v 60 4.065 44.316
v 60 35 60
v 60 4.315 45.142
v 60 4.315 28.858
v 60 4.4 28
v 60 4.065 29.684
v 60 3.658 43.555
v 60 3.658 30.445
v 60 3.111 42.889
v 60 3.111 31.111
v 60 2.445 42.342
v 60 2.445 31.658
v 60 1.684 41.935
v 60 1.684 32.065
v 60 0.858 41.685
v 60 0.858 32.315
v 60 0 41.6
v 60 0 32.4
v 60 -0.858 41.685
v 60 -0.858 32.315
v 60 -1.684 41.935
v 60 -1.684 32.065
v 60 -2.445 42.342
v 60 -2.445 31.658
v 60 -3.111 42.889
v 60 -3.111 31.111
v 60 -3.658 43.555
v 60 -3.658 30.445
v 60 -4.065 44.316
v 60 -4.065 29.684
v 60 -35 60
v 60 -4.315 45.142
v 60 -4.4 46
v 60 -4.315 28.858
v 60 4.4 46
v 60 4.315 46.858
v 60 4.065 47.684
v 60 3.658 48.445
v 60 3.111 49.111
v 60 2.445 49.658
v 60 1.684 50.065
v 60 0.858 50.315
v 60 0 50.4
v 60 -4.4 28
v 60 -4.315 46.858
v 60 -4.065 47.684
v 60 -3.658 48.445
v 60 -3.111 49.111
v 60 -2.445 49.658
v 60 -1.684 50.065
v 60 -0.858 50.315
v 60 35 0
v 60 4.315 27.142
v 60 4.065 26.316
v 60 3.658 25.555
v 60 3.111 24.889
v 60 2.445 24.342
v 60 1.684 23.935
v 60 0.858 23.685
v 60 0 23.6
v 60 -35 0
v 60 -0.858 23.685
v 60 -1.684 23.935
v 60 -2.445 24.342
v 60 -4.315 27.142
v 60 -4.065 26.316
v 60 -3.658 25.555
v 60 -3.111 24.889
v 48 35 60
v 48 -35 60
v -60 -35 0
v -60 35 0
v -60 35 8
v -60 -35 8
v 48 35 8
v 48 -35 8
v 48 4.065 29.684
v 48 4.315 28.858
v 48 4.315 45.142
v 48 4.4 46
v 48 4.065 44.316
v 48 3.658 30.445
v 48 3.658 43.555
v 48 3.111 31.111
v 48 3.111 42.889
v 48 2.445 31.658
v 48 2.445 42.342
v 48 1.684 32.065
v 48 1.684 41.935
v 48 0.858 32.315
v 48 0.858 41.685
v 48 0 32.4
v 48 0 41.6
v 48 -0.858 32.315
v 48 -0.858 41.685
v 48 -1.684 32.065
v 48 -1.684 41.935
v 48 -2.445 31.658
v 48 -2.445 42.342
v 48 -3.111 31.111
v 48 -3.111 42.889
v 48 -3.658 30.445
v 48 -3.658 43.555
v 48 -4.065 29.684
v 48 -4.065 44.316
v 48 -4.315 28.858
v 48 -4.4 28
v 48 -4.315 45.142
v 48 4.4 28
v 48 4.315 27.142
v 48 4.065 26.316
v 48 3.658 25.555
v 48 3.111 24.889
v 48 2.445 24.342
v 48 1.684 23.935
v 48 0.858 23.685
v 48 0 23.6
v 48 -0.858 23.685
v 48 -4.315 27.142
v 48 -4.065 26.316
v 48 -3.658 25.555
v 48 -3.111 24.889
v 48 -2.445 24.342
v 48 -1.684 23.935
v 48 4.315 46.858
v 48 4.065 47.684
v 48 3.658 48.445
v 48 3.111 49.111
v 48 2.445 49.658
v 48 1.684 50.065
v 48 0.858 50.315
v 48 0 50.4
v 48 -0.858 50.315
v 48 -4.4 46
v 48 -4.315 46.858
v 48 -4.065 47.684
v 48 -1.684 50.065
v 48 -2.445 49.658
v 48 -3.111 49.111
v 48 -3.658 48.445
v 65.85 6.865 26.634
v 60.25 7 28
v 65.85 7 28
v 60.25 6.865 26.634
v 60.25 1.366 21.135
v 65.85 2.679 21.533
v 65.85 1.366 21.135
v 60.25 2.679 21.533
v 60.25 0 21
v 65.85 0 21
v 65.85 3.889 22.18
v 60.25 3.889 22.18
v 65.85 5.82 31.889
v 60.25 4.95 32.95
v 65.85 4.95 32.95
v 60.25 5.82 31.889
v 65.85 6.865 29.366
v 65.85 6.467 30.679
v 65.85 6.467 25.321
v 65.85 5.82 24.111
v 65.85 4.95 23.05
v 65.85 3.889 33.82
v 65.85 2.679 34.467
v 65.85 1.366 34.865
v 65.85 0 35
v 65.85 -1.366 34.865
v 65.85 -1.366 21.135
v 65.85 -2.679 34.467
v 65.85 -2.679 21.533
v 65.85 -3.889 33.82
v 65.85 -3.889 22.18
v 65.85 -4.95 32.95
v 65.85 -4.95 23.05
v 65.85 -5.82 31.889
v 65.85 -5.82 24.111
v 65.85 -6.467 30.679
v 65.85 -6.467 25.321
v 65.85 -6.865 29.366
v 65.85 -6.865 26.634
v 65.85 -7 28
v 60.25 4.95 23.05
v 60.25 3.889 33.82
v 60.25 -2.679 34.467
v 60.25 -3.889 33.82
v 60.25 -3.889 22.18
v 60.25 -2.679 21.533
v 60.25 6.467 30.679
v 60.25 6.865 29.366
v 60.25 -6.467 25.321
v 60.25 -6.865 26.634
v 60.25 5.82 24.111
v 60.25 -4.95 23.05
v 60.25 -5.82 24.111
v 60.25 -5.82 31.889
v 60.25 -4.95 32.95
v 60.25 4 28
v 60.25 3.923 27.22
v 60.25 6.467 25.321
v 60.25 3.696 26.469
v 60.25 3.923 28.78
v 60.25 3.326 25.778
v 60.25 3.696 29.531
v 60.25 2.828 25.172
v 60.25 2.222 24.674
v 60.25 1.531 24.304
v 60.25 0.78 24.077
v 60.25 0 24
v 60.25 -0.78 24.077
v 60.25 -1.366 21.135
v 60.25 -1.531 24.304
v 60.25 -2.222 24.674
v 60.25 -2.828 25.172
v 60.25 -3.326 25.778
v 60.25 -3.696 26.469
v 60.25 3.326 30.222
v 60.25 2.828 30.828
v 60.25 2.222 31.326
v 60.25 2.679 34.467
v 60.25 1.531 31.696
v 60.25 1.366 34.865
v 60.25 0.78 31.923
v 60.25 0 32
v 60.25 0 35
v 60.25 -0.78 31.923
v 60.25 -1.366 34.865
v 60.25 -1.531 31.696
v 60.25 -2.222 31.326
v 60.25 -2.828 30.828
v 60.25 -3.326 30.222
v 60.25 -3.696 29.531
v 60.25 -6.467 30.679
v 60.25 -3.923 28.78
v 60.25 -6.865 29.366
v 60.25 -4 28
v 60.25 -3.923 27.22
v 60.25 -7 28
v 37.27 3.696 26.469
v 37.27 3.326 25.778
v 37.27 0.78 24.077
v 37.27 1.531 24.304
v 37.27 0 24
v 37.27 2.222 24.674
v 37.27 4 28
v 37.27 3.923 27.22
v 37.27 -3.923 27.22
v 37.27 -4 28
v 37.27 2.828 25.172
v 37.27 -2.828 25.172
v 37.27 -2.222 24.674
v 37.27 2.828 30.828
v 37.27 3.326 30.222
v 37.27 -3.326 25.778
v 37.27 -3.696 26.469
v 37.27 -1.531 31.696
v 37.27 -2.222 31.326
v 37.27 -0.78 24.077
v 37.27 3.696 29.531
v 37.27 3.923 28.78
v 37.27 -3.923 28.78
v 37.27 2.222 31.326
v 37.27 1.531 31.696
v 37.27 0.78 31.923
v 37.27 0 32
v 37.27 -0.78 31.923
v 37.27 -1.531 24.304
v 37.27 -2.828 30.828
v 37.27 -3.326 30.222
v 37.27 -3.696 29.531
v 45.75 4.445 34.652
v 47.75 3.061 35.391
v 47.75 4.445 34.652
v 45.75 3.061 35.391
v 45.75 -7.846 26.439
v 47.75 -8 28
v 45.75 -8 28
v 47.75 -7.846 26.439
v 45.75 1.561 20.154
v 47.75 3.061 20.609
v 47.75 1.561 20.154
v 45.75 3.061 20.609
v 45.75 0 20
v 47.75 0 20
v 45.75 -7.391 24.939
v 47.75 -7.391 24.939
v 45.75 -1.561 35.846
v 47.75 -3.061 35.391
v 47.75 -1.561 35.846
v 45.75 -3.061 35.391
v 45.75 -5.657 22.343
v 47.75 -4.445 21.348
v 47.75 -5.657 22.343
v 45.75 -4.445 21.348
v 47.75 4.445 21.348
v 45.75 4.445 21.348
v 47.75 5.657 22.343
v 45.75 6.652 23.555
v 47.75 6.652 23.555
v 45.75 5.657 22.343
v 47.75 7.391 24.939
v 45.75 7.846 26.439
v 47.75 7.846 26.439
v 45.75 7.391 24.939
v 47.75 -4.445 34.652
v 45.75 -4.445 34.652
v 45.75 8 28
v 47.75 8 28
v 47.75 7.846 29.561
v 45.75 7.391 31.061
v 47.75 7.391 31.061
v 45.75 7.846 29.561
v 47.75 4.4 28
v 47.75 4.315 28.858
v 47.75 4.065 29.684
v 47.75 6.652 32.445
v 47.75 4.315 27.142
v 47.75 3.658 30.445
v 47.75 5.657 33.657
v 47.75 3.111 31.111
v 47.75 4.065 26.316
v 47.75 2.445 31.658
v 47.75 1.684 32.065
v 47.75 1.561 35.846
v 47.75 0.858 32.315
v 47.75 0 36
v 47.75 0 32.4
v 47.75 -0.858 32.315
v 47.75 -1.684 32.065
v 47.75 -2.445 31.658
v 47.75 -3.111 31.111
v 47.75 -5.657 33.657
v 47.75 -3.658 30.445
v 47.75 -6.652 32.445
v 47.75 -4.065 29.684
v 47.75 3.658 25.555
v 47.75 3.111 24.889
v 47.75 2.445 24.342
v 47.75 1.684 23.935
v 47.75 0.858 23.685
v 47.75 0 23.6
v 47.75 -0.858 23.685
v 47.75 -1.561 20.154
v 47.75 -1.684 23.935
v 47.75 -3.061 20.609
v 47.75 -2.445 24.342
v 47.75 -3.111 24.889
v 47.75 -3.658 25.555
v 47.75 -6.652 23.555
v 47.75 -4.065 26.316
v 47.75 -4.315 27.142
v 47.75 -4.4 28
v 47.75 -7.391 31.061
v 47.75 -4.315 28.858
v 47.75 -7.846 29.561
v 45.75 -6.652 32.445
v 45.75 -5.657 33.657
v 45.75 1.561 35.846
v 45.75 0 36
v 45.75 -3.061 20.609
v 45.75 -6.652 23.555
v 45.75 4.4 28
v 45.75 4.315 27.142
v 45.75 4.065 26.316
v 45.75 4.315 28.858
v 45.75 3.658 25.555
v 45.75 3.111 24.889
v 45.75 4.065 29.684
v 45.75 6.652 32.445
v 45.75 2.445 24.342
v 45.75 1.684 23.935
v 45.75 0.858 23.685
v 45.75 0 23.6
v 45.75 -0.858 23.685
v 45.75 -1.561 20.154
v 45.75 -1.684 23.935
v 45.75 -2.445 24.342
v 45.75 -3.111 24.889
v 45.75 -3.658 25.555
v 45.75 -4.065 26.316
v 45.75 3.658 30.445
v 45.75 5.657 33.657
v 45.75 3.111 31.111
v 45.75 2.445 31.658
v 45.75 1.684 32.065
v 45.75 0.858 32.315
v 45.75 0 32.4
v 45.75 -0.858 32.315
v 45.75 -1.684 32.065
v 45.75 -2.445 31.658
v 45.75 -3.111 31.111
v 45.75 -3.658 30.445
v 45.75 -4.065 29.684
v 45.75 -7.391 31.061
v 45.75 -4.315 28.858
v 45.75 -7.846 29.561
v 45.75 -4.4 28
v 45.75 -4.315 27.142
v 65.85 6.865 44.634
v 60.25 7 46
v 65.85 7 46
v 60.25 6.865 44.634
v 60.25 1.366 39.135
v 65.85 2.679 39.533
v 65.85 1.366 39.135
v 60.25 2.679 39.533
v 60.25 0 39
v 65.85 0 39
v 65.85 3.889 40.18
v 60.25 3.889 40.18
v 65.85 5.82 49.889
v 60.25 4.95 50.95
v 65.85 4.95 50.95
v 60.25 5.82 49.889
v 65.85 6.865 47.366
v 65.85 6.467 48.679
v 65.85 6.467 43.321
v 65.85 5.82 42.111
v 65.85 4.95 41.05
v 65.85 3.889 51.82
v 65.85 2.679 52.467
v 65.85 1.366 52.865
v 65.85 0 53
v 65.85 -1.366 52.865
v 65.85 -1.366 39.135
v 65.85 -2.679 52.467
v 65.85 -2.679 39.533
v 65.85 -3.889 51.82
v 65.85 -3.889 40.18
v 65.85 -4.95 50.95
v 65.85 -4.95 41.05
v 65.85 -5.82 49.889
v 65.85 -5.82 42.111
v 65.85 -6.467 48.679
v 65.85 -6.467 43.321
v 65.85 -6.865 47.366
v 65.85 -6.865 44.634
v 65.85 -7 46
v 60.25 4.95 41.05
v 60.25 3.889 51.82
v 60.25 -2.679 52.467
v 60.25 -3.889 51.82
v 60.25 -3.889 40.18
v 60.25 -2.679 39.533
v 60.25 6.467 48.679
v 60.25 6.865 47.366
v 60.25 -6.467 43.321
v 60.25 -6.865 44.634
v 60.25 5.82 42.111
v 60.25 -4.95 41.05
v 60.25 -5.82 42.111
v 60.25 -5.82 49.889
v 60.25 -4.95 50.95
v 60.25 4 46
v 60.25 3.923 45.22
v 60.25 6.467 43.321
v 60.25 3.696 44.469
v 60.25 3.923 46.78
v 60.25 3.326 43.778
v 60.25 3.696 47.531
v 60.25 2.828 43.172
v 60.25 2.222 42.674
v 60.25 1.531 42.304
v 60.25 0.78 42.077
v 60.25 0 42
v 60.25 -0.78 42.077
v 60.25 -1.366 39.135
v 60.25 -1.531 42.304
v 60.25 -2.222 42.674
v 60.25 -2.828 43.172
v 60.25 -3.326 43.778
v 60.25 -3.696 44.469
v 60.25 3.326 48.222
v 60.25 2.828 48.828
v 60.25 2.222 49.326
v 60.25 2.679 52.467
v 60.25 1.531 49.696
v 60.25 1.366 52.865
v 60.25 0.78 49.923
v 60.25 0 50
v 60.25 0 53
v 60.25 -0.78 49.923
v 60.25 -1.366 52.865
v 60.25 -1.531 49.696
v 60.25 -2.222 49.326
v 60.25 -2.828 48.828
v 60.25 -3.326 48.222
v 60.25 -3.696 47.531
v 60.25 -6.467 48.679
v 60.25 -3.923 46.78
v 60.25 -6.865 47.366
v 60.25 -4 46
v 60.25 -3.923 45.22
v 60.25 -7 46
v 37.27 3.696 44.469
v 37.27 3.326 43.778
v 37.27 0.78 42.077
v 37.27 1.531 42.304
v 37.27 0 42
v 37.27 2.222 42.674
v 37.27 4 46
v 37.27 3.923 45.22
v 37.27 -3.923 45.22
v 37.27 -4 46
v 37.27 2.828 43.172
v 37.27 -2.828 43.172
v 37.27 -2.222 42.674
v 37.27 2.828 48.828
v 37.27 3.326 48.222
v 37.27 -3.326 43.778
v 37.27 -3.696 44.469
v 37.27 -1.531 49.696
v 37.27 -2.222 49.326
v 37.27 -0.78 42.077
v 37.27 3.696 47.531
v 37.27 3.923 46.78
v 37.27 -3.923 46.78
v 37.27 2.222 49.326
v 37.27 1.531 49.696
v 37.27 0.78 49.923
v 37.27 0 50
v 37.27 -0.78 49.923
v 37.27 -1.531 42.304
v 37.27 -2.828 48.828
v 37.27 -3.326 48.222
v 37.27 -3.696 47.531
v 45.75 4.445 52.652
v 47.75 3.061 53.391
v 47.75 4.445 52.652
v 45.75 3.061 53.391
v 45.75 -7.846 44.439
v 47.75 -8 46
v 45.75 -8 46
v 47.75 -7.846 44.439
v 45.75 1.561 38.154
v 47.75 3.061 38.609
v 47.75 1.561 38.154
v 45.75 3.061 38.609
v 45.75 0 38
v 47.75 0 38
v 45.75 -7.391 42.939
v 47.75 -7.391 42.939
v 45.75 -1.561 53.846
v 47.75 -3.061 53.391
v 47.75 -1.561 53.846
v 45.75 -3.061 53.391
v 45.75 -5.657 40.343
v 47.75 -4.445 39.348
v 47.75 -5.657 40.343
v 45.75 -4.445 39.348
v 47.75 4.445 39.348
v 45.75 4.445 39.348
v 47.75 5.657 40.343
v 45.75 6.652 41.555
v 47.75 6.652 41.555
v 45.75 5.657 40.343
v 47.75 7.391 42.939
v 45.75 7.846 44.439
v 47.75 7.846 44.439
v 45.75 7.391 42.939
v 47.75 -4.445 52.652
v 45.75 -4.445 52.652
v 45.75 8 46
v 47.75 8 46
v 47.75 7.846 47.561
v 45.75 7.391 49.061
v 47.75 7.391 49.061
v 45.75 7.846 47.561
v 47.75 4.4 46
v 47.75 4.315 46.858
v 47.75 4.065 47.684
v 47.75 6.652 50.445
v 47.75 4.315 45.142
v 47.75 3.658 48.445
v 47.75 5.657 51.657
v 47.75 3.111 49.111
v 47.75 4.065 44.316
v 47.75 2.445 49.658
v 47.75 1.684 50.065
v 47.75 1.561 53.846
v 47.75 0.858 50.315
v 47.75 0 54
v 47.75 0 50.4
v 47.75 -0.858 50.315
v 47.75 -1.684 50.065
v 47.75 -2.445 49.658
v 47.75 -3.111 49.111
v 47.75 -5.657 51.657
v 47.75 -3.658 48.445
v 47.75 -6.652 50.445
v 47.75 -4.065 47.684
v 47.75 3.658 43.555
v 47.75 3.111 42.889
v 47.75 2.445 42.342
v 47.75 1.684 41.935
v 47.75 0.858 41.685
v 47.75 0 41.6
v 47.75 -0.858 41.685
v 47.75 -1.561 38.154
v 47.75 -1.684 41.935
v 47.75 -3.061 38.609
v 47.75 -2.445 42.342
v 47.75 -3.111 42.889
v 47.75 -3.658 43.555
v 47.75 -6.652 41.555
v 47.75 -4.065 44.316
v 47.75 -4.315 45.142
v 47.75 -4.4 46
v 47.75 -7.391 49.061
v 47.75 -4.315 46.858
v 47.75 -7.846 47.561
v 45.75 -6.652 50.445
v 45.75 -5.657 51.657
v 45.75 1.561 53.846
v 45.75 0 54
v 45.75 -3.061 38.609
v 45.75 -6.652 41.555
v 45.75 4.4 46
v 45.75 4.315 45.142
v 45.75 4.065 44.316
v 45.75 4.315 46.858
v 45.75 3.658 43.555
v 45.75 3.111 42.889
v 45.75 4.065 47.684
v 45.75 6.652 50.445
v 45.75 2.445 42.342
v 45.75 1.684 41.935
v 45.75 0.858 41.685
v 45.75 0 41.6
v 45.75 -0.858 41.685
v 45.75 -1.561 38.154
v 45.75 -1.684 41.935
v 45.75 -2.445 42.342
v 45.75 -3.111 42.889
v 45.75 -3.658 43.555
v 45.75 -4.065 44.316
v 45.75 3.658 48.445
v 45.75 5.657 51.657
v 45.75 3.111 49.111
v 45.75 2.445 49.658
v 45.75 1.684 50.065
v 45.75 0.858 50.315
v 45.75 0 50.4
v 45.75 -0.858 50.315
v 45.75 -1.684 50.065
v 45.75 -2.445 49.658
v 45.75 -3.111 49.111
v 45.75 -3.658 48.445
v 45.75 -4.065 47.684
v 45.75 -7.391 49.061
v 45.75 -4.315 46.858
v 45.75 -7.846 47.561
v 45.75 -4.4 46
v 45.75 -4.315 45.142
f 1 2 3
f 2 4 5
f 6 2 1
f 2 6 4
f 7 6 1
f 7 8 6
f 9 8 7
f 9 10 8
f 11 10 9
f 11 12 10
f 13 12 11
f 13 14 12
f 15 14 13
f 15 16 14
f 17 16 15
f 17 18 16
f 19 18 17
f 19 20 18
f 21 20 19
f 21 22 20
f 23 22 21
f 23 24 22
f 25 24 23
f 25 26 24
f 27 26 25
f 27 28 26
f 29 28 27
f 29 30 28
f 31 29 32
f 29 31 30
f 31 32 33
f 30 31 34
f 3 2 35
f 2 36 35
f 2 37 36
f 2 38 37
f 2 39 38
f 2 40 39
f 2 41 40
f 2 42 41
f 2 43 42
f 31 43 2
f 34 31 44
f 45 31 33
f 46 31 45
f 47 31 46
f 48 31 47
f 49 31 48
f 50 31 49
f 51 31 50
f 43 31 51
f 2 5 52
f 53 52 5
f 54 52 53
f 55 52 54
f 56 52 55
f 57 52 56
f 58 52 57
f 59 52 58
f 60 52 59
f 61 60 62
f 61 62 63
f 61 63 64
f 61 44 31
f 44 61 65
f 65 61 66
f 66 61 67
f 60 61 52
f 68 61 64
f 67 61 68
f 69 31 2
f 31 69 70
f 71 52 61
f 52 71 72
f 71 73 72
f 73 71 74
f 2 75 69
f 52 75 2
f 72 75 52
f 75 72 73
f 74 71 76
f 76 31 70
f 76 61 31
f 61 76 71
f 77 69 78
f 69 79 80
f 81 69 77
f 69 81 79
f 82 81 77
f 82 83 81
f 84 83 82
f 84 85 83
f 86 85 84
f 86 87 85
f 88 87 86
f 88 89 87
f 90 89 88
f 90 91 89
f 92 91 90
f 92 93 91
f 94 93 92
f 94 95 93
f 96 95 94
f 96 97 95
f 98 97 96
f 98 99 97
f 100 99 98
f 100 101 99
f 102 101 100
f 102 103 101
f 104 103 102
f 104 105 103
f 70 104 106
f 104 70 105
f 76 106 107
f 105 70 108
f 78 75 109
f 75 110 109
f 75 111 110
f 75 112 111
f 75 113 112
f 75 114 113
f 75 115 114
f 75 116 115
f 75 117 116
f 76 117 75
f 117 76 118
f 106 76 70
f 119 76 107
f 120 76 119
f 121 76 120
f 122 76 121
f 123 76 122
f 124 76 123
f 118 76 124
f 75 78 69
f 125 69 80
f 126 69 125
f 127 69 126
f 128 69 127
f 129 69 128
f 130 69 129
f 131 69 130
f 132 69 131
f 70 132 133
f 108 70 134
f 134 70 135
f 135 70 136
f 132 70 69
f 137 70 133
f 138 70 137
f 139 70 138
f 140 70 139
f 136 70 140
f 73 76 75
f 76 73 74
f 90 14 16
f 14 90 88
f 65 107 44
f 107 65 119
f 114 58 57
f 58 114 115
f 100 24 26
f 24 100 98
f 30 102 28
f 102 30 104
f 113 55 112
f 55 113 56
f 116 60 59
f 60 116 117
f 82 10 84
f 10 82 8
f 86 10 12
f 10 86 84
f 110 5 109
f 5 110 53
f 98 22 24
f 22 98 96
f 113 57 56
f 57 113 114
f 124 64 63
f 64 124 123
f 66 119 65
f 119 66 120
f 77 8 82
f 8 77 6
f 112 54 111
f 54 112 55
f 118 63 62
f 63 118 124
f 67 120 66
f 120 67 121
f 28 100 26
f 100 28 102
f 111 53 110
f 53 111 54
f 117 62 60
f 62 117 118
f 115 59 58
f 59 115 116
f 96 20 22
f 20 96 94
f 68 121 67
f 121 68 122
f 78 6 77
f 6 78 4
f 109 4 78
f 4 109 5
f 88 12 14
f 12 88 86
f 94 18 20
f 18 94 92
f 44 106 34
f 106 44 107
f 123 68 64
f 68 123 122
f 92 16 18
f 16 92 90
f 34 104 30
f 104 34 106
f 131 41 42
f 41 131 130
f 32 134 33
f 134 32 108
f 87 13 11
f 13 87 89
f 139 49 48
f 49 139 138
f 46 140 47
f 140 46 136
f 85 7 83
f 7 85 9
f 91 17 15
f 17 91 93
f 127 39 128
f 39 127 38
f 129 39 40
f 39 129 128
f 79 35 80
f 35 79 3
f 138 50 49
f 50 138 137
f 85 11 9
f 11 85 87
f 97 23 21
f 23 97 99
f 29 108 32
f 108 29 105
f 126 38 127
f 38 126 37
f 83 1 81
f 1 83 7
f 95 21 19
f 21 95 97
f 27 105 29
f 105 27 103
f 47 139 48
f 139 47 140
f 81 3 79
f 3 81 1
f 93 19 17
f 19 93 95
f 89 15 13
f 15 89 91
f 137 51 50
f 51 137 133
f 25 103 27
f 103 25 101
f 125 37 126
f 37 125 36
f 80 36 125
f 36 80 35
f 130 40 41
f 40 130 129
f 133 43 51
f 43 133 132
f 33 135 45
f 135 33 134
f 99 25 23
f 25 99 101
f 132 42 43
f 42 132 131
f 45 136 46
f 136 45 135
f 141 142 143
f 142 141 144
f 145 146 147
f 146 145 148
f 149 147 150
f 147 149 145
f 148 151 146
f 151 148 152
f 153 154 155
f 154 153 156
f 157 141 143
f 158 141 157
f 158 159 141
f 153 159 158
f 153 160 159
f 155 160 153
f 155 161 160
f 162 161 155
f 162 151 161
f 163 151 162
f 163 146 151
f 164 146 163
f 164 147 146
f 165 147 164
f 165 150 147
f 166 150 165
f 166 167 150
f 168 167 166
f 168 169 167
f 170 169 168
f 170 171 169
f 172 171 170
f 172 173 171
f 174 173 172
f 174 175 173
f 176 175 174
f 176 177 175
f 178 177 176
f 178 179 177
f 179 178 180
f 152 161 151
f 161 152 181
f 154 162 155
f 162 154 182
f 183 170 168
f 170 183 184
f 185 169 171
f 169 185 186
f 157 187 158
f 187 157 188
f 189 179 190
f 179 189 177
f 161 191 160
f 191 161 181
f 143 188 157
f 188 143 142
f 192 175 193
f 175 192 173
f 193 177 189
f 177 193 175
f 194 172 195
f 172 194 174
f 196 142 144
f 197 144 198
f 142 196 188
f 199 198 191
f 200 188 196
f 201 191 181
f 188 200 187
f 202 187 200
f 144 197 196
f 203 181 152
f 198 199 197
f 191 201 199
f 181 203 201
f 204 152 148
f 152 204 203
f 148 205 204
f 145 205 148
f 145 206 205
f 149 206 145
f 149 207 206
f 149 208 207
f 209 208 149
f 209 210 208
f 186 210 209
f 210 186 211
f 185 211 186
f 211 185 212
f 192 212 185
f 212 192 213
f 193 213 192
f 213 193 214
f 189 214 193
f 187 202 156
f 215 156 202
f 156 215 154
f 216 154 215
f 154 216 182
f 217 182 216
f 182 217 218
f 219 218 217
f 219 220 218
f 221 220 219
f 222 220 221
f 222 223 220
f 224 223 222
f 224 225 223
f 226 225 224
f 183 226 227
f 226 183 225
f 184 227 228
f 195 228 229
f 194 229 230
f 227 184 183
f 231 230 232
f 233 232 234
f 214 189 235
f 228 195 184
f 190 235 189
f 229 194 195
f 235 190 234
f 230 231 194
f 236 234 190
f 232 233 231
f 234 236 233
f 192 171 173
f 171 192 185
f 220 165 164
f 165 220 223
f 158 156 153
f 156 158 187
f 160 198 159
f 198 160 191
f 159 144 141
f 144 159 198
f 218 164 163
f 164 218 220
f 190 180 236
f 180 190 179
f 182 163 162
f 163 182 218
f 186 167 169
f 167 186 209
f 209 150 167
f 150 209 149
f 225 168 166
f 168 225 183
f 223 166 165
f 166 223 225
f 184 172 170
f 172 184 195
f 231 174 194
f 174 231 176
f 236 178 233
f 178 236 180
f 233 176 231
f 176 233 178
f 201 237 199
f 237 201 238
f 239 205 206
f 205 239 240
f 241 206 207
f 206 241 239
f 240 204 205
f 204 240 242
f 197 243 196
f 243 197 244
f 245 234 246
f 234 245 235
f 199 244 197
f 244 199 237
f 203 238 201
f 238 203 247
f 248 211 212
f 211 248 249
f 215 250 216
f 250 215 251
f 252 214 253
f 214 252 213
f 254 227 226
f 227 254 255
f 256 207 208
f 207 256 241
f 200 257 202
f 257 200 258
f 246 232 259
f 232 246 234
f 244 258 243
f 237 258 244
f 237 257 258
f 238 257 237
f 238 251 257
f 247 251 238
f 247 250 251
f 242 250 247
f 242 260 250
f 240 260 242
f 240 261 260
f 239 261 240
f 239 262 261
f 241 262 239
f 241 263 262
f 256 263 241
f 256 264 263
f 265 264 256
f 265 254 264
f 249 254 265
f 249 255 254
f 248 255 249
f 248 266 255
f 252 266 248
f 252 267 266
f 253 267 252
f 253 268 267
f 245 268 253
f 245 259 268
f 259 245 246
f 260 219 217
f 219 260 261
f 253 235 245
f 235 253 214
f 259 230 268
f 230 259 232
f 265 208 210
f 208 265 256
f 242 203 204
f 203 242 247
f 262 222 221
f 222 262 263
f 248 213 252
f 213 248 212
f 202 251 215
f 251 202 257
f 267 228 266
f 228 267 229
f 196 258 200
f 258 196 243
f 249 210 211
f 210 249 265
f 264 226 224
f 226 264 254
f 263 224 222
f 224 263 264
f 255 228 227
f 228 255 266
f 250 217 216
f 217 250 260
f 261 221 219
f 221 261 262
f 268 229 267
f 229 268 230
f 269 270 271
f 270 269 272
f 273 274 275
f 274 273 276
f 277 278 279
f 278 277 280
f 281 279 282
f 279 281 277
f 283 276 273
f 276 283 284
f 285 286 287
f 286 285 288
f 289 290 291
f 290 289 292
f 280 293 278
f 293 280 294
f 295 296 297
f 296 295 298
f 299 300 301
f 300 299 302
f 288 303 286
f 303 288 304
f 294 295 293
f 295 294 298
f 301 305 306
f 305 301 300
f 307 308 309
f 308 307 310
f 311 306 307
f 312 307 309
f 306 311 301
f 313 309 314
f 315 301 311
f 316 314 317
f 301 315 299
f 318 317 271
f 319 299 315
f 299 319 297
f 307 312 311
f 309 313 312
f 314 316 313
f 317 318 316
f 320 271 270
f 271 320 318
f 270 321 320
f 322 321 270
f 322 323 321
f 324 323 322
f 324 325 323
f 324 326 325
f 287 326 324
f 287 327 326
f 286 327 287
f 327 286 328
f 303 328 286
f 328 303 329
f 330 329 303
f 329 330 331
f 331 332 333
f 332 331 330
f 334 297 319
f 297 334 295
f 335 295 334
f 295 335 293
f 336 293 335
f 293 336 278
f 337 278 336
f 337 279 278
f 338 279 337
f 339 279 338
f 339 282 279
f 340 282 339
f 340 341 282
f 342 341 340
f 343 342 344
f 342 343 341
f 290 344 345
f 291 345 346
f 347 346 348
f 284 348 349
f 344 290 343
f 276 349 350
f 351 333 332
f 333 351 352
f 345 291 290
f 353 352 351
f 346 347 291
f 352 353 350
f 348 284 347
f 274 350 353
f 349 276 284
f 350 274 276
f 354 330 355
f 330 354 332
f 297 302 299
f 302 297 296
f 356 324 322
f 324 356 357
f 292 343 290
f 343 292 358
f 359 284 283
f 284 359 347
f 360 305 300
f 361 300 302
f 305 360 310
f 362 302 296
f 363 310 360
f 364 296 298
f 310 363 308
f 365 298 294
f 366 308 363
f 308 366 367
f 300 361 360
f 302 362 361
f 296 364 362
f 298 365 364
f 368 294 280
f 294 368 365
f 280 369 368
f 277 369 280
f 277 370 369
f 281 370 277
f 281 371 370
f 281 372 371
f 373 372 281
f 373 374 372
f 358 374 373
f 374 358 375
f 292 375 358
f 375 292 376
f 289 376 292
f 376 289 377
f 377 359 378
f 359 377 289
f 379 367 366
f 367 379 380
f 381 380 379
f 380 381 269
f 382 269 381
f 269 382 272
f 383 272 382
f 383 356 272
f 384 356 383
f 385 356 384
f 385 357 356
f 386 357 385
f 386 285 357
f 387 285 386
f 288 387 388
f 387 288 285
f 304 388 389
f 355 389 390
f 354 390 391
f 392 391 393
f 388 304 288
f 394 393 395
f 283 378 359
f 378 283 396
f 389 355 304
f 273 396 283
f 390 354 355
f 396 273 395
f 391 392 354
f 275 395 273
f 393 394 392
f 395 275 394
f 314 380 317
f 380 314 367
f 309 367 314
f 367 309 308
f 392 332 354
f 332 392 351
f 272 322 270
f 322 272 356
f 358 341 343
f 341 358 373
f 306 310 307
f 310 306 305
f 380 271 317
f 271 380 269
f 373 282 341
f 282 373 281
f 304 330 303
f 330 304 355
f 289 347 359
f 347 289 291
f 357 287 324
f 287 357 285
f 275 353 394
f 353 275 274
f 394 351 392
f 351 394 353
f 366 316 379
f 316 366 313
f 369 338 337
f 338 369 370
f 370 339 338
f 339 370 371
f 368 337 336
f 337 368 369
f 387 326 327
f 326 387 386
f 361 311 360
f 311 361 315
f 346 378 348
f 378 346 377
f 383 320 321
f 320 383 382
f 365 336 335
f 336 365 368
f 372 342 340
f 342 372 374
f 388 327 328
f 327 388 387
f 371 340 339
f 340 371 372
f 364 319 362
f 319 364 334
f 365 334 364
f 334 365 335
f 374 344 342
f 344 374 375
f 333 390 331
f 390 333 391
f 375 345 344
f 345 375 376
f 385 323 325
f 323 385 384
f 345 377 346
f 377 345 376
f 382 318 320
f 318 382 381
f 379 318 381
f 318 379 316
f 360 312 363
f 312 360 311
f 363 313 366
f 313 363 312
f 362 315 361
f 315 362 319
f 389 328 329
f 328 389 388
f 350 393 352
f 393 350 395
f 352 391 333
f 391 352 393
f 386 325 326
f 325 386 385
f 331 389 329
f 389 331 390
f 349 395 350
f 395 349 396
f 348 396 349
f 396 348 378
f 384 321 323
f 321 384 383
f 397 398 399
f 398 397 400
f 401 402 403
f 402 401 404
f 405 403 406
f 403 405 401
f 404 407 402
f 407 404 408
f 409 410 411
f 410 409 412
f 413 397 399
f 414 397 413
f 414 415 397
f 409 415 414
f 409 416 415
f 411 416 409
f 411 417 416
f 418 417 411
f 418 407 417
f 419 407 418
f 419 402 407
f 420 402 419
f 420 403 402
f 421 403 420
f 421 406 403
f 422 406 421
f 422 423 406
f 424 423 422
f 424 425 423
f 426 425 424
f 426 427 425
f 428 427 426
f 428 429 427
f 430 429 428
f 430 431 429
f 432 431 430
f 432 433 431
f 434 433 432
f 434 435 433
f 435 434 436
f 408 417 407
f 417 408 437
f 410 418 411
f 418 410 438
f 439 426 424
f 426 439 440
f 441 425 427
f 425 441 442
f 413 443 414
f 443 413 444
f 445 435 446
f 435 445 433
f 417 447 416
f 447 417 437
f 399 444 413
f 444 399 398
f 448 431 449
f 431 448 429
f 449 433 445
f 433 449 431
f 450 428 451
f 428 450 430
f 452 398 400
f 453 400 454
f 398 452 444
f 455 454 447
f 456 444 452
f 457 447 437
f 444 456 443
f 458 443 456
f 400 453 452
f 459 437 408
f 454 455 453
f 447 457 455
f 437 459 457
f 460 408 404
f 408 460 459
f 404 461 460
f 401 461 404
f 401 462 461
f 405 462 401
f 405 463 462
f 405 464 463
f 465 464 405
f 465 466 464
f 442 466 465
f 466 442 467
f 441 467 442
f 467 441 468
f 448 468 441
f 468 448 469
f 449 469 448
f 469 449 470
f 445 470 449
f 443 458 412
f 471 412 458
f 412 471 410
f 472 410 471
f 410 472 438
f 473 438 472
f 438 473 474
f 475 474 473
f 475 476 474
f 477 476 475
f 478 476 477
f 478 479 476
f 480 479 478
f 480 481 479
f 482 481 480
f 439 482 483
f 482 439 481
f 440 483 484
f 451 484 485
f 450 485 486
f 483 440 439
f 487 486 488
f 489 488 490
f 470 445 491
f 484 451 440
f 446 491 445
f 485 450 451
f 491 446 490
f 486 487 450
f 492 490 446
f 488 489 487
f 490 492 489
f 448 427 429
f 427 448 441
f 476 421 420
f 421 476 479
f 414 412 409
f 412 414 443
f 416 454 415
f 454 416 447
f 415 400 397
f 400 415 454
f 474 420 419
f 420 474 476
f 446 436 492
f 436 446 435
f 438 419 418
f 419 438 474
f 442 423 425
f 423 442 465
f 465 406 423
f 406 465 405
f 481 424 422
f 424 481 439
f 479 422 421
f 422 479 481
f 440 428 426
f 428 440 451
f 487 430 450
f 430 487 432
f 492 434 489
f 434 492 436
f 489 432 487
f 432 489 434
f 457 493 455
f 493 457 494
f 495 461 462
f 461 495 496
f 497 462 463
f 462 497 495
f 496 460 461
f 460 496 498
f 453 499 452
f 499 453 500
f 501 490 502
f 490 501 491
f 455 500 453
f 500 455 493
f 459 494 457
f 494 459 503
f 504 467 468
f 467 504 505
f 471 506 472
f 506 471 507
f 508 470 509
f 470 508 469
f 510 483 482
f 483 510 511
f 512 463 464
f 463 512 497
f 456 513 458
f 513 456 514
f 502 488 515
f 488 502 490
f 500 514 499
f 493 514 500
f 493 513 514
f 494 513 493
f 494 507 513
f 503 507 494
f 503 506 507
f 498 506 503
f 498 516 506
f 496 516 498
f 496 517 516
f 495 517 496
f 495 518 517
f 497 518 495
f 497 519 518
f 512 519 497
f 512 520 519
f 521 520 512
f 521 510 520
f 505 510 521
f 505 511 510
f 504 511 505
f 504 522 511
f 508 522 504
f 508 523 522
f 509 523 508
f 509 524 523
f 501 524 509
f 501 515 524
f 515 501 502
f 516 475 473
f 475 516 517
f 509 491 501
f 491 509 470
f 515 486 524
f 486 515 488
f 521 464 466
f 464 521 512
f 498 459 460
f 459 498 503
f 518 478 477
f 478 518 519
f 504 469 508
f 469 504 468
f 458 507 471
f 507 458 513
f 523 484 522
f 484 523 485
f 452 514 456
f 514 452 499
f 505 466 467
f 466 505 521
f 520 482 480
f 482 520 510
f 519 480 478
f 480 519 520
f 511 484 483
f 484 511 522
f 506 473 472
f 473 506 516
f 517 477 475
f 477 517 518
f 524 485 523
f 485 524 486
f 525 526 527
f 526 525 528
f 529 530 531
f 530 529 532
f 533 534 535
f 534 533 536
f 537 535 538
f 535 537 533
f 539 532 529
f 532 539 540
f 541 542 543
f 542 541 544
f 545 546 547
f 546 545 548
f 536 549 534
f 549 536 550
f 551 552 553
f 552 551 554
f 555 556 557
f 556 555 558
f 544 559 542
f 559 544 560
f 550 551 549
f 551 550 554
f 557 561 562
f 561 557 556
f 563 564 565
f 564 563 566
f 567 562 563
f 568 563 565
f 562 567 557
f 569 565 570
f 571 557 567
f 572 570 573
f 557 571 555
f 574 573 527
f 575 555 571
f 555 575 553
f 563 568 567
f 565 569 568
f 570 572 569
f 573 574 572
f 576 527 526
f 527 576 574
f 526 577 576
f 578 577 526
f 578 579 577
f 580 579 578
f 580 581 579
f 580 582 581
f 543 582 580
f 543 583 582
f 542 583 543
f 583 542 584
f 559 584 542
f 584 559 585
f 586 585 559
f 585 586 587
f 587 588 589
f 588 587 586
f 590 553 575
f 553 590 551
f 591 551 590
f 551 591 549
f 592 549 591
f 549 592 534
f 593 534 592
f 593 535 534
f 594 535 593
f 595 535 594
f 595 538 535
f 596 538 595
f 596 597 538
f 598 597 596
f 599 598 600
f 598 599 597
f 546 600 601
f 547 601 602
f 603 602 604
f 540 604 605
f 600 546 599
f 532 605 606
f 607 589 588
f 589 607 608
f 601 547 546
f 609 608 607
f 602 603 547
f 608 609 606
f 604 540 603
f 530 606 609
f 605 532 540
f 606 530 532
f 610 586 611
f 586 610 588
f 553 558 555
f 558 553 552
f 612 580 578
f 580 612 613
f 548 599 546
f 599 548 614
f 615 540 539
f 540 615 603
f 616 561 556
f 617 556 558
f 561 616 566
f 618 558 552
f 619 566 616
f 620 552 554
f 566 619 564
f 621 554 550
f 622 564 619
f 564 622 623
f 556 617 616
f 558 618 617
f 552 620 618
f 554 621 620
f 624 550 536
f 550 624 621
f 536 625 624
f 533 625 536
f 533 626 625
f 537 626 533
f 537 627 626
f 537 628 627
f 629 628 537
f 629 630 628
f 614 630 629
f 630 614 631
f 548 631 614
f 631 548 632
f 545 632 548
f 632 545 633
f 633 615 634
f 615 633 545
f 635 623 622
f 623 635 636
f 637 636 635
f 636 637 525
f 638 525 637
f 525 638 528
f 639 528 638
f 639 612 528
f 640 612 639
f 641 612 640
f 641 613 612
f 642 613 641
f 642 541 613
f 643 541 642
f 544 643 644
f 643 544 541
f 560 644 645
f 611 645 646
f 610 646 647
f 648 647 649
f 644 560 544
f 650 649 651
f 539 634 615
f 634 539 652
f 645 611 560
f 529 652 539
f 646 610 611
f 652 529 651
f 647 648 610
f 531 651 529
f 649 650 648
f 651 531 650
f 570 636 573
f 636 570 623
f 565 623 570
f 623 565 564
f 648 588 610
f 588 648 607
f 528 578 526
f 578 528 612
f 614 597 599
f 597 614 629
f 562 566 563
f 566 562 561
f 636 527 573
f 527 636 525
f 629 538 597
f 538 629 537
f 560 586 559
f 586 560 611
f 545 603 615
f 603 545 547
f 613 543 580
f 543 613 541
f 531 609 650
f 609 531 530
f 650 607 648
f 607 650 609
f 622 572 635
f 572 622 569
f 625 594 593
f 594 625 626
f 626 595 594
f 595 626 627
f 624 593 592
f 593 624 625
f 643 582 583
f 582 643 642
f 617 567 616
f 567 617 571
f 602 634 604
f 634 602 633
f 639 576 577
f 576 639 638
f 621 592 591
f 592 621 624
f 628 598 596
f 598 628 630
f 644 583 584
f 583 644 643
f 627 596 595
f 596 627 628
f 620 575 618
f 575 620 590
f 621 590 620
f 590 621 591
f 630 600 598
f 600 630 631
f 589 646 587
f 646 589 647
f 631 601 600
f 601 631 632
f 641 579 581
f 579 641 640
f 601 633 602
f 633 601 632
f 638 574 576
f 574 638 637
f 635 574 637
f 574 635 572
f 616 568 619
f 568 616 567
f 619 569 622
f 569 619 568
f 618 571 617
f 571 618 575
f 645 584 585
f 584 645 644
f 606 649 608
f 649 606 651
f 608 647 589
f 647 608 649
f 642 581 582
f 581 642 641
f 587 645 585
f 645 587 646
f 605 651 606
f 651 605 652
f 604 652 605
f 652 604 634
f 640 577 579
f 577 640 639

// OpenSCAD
$fn = 32;

// ------------------------------------------------------------------------
// Bolted bracket: 120 x 70 mm bracket with 2 bolt joints
// Every part is its own module, assembly() places them once.
// ------------------------------------------------------------------------

// --- part 1 ---
module bracket() {
  difference() {
    translate([-60, -35, 0]) cube([120, 70, 60]);
    translate([-61, -36, 8]) cube([109, 72, 53]);
    translate([54, 0, 28]) rotate([0, 90, 0]) cylinder(h = 14, d = 8.8, center = true);
    translate([54, 0, 46]) rotate([0, 90, 0]) cylinder(h = 14, d = 8.8, center = true);
  }
}

// --- part 2 ---
module bolt1() {
  cylinder(h = 5.6, d = 14);
  translate([0, 0, -22.98]) cylinder(h = 22.98, d = 8);
}

// --- part 3 ---
module washer1() {
  difference() {
      translate([0, 0, 0]) cylinder(h = 2, d = 16);
      translate([0, 0, -1]) cylinder(h = 4, d = 8.8);
    }
}

// --- part 4 ---
module bolt2() {
  cylinder(h = 5.6, d = 14);
  translate([0, 0, -22.98]) cylinder(h = 22.98, d = 8);
}

// --- part 5 ---
module washer2() {
  difference() {
      translate([0, 0, 0]) cylinder(h = 2, d = 16);
      translate([0, 0, -1]) cylinder(h = 4, d = 8.8);
    }
}

// --- assembly ---
module assembly() {
  translate([0, 0, 0]) rotate([0, 0, 0]) bracket();
  translate([60.25, 0, 28]) rotate([0, 90, 0]) bolt1();
  translate([45.75, 0, 28]) rotate([0, 90, 0]) washer1();
  translate([60.25, 0, 46]) rotate([0, 90, 0]) bolt2();
  translate([45.75, 0, 46]) rotate([0, 90, 0]) washer2();
}

assembly();
